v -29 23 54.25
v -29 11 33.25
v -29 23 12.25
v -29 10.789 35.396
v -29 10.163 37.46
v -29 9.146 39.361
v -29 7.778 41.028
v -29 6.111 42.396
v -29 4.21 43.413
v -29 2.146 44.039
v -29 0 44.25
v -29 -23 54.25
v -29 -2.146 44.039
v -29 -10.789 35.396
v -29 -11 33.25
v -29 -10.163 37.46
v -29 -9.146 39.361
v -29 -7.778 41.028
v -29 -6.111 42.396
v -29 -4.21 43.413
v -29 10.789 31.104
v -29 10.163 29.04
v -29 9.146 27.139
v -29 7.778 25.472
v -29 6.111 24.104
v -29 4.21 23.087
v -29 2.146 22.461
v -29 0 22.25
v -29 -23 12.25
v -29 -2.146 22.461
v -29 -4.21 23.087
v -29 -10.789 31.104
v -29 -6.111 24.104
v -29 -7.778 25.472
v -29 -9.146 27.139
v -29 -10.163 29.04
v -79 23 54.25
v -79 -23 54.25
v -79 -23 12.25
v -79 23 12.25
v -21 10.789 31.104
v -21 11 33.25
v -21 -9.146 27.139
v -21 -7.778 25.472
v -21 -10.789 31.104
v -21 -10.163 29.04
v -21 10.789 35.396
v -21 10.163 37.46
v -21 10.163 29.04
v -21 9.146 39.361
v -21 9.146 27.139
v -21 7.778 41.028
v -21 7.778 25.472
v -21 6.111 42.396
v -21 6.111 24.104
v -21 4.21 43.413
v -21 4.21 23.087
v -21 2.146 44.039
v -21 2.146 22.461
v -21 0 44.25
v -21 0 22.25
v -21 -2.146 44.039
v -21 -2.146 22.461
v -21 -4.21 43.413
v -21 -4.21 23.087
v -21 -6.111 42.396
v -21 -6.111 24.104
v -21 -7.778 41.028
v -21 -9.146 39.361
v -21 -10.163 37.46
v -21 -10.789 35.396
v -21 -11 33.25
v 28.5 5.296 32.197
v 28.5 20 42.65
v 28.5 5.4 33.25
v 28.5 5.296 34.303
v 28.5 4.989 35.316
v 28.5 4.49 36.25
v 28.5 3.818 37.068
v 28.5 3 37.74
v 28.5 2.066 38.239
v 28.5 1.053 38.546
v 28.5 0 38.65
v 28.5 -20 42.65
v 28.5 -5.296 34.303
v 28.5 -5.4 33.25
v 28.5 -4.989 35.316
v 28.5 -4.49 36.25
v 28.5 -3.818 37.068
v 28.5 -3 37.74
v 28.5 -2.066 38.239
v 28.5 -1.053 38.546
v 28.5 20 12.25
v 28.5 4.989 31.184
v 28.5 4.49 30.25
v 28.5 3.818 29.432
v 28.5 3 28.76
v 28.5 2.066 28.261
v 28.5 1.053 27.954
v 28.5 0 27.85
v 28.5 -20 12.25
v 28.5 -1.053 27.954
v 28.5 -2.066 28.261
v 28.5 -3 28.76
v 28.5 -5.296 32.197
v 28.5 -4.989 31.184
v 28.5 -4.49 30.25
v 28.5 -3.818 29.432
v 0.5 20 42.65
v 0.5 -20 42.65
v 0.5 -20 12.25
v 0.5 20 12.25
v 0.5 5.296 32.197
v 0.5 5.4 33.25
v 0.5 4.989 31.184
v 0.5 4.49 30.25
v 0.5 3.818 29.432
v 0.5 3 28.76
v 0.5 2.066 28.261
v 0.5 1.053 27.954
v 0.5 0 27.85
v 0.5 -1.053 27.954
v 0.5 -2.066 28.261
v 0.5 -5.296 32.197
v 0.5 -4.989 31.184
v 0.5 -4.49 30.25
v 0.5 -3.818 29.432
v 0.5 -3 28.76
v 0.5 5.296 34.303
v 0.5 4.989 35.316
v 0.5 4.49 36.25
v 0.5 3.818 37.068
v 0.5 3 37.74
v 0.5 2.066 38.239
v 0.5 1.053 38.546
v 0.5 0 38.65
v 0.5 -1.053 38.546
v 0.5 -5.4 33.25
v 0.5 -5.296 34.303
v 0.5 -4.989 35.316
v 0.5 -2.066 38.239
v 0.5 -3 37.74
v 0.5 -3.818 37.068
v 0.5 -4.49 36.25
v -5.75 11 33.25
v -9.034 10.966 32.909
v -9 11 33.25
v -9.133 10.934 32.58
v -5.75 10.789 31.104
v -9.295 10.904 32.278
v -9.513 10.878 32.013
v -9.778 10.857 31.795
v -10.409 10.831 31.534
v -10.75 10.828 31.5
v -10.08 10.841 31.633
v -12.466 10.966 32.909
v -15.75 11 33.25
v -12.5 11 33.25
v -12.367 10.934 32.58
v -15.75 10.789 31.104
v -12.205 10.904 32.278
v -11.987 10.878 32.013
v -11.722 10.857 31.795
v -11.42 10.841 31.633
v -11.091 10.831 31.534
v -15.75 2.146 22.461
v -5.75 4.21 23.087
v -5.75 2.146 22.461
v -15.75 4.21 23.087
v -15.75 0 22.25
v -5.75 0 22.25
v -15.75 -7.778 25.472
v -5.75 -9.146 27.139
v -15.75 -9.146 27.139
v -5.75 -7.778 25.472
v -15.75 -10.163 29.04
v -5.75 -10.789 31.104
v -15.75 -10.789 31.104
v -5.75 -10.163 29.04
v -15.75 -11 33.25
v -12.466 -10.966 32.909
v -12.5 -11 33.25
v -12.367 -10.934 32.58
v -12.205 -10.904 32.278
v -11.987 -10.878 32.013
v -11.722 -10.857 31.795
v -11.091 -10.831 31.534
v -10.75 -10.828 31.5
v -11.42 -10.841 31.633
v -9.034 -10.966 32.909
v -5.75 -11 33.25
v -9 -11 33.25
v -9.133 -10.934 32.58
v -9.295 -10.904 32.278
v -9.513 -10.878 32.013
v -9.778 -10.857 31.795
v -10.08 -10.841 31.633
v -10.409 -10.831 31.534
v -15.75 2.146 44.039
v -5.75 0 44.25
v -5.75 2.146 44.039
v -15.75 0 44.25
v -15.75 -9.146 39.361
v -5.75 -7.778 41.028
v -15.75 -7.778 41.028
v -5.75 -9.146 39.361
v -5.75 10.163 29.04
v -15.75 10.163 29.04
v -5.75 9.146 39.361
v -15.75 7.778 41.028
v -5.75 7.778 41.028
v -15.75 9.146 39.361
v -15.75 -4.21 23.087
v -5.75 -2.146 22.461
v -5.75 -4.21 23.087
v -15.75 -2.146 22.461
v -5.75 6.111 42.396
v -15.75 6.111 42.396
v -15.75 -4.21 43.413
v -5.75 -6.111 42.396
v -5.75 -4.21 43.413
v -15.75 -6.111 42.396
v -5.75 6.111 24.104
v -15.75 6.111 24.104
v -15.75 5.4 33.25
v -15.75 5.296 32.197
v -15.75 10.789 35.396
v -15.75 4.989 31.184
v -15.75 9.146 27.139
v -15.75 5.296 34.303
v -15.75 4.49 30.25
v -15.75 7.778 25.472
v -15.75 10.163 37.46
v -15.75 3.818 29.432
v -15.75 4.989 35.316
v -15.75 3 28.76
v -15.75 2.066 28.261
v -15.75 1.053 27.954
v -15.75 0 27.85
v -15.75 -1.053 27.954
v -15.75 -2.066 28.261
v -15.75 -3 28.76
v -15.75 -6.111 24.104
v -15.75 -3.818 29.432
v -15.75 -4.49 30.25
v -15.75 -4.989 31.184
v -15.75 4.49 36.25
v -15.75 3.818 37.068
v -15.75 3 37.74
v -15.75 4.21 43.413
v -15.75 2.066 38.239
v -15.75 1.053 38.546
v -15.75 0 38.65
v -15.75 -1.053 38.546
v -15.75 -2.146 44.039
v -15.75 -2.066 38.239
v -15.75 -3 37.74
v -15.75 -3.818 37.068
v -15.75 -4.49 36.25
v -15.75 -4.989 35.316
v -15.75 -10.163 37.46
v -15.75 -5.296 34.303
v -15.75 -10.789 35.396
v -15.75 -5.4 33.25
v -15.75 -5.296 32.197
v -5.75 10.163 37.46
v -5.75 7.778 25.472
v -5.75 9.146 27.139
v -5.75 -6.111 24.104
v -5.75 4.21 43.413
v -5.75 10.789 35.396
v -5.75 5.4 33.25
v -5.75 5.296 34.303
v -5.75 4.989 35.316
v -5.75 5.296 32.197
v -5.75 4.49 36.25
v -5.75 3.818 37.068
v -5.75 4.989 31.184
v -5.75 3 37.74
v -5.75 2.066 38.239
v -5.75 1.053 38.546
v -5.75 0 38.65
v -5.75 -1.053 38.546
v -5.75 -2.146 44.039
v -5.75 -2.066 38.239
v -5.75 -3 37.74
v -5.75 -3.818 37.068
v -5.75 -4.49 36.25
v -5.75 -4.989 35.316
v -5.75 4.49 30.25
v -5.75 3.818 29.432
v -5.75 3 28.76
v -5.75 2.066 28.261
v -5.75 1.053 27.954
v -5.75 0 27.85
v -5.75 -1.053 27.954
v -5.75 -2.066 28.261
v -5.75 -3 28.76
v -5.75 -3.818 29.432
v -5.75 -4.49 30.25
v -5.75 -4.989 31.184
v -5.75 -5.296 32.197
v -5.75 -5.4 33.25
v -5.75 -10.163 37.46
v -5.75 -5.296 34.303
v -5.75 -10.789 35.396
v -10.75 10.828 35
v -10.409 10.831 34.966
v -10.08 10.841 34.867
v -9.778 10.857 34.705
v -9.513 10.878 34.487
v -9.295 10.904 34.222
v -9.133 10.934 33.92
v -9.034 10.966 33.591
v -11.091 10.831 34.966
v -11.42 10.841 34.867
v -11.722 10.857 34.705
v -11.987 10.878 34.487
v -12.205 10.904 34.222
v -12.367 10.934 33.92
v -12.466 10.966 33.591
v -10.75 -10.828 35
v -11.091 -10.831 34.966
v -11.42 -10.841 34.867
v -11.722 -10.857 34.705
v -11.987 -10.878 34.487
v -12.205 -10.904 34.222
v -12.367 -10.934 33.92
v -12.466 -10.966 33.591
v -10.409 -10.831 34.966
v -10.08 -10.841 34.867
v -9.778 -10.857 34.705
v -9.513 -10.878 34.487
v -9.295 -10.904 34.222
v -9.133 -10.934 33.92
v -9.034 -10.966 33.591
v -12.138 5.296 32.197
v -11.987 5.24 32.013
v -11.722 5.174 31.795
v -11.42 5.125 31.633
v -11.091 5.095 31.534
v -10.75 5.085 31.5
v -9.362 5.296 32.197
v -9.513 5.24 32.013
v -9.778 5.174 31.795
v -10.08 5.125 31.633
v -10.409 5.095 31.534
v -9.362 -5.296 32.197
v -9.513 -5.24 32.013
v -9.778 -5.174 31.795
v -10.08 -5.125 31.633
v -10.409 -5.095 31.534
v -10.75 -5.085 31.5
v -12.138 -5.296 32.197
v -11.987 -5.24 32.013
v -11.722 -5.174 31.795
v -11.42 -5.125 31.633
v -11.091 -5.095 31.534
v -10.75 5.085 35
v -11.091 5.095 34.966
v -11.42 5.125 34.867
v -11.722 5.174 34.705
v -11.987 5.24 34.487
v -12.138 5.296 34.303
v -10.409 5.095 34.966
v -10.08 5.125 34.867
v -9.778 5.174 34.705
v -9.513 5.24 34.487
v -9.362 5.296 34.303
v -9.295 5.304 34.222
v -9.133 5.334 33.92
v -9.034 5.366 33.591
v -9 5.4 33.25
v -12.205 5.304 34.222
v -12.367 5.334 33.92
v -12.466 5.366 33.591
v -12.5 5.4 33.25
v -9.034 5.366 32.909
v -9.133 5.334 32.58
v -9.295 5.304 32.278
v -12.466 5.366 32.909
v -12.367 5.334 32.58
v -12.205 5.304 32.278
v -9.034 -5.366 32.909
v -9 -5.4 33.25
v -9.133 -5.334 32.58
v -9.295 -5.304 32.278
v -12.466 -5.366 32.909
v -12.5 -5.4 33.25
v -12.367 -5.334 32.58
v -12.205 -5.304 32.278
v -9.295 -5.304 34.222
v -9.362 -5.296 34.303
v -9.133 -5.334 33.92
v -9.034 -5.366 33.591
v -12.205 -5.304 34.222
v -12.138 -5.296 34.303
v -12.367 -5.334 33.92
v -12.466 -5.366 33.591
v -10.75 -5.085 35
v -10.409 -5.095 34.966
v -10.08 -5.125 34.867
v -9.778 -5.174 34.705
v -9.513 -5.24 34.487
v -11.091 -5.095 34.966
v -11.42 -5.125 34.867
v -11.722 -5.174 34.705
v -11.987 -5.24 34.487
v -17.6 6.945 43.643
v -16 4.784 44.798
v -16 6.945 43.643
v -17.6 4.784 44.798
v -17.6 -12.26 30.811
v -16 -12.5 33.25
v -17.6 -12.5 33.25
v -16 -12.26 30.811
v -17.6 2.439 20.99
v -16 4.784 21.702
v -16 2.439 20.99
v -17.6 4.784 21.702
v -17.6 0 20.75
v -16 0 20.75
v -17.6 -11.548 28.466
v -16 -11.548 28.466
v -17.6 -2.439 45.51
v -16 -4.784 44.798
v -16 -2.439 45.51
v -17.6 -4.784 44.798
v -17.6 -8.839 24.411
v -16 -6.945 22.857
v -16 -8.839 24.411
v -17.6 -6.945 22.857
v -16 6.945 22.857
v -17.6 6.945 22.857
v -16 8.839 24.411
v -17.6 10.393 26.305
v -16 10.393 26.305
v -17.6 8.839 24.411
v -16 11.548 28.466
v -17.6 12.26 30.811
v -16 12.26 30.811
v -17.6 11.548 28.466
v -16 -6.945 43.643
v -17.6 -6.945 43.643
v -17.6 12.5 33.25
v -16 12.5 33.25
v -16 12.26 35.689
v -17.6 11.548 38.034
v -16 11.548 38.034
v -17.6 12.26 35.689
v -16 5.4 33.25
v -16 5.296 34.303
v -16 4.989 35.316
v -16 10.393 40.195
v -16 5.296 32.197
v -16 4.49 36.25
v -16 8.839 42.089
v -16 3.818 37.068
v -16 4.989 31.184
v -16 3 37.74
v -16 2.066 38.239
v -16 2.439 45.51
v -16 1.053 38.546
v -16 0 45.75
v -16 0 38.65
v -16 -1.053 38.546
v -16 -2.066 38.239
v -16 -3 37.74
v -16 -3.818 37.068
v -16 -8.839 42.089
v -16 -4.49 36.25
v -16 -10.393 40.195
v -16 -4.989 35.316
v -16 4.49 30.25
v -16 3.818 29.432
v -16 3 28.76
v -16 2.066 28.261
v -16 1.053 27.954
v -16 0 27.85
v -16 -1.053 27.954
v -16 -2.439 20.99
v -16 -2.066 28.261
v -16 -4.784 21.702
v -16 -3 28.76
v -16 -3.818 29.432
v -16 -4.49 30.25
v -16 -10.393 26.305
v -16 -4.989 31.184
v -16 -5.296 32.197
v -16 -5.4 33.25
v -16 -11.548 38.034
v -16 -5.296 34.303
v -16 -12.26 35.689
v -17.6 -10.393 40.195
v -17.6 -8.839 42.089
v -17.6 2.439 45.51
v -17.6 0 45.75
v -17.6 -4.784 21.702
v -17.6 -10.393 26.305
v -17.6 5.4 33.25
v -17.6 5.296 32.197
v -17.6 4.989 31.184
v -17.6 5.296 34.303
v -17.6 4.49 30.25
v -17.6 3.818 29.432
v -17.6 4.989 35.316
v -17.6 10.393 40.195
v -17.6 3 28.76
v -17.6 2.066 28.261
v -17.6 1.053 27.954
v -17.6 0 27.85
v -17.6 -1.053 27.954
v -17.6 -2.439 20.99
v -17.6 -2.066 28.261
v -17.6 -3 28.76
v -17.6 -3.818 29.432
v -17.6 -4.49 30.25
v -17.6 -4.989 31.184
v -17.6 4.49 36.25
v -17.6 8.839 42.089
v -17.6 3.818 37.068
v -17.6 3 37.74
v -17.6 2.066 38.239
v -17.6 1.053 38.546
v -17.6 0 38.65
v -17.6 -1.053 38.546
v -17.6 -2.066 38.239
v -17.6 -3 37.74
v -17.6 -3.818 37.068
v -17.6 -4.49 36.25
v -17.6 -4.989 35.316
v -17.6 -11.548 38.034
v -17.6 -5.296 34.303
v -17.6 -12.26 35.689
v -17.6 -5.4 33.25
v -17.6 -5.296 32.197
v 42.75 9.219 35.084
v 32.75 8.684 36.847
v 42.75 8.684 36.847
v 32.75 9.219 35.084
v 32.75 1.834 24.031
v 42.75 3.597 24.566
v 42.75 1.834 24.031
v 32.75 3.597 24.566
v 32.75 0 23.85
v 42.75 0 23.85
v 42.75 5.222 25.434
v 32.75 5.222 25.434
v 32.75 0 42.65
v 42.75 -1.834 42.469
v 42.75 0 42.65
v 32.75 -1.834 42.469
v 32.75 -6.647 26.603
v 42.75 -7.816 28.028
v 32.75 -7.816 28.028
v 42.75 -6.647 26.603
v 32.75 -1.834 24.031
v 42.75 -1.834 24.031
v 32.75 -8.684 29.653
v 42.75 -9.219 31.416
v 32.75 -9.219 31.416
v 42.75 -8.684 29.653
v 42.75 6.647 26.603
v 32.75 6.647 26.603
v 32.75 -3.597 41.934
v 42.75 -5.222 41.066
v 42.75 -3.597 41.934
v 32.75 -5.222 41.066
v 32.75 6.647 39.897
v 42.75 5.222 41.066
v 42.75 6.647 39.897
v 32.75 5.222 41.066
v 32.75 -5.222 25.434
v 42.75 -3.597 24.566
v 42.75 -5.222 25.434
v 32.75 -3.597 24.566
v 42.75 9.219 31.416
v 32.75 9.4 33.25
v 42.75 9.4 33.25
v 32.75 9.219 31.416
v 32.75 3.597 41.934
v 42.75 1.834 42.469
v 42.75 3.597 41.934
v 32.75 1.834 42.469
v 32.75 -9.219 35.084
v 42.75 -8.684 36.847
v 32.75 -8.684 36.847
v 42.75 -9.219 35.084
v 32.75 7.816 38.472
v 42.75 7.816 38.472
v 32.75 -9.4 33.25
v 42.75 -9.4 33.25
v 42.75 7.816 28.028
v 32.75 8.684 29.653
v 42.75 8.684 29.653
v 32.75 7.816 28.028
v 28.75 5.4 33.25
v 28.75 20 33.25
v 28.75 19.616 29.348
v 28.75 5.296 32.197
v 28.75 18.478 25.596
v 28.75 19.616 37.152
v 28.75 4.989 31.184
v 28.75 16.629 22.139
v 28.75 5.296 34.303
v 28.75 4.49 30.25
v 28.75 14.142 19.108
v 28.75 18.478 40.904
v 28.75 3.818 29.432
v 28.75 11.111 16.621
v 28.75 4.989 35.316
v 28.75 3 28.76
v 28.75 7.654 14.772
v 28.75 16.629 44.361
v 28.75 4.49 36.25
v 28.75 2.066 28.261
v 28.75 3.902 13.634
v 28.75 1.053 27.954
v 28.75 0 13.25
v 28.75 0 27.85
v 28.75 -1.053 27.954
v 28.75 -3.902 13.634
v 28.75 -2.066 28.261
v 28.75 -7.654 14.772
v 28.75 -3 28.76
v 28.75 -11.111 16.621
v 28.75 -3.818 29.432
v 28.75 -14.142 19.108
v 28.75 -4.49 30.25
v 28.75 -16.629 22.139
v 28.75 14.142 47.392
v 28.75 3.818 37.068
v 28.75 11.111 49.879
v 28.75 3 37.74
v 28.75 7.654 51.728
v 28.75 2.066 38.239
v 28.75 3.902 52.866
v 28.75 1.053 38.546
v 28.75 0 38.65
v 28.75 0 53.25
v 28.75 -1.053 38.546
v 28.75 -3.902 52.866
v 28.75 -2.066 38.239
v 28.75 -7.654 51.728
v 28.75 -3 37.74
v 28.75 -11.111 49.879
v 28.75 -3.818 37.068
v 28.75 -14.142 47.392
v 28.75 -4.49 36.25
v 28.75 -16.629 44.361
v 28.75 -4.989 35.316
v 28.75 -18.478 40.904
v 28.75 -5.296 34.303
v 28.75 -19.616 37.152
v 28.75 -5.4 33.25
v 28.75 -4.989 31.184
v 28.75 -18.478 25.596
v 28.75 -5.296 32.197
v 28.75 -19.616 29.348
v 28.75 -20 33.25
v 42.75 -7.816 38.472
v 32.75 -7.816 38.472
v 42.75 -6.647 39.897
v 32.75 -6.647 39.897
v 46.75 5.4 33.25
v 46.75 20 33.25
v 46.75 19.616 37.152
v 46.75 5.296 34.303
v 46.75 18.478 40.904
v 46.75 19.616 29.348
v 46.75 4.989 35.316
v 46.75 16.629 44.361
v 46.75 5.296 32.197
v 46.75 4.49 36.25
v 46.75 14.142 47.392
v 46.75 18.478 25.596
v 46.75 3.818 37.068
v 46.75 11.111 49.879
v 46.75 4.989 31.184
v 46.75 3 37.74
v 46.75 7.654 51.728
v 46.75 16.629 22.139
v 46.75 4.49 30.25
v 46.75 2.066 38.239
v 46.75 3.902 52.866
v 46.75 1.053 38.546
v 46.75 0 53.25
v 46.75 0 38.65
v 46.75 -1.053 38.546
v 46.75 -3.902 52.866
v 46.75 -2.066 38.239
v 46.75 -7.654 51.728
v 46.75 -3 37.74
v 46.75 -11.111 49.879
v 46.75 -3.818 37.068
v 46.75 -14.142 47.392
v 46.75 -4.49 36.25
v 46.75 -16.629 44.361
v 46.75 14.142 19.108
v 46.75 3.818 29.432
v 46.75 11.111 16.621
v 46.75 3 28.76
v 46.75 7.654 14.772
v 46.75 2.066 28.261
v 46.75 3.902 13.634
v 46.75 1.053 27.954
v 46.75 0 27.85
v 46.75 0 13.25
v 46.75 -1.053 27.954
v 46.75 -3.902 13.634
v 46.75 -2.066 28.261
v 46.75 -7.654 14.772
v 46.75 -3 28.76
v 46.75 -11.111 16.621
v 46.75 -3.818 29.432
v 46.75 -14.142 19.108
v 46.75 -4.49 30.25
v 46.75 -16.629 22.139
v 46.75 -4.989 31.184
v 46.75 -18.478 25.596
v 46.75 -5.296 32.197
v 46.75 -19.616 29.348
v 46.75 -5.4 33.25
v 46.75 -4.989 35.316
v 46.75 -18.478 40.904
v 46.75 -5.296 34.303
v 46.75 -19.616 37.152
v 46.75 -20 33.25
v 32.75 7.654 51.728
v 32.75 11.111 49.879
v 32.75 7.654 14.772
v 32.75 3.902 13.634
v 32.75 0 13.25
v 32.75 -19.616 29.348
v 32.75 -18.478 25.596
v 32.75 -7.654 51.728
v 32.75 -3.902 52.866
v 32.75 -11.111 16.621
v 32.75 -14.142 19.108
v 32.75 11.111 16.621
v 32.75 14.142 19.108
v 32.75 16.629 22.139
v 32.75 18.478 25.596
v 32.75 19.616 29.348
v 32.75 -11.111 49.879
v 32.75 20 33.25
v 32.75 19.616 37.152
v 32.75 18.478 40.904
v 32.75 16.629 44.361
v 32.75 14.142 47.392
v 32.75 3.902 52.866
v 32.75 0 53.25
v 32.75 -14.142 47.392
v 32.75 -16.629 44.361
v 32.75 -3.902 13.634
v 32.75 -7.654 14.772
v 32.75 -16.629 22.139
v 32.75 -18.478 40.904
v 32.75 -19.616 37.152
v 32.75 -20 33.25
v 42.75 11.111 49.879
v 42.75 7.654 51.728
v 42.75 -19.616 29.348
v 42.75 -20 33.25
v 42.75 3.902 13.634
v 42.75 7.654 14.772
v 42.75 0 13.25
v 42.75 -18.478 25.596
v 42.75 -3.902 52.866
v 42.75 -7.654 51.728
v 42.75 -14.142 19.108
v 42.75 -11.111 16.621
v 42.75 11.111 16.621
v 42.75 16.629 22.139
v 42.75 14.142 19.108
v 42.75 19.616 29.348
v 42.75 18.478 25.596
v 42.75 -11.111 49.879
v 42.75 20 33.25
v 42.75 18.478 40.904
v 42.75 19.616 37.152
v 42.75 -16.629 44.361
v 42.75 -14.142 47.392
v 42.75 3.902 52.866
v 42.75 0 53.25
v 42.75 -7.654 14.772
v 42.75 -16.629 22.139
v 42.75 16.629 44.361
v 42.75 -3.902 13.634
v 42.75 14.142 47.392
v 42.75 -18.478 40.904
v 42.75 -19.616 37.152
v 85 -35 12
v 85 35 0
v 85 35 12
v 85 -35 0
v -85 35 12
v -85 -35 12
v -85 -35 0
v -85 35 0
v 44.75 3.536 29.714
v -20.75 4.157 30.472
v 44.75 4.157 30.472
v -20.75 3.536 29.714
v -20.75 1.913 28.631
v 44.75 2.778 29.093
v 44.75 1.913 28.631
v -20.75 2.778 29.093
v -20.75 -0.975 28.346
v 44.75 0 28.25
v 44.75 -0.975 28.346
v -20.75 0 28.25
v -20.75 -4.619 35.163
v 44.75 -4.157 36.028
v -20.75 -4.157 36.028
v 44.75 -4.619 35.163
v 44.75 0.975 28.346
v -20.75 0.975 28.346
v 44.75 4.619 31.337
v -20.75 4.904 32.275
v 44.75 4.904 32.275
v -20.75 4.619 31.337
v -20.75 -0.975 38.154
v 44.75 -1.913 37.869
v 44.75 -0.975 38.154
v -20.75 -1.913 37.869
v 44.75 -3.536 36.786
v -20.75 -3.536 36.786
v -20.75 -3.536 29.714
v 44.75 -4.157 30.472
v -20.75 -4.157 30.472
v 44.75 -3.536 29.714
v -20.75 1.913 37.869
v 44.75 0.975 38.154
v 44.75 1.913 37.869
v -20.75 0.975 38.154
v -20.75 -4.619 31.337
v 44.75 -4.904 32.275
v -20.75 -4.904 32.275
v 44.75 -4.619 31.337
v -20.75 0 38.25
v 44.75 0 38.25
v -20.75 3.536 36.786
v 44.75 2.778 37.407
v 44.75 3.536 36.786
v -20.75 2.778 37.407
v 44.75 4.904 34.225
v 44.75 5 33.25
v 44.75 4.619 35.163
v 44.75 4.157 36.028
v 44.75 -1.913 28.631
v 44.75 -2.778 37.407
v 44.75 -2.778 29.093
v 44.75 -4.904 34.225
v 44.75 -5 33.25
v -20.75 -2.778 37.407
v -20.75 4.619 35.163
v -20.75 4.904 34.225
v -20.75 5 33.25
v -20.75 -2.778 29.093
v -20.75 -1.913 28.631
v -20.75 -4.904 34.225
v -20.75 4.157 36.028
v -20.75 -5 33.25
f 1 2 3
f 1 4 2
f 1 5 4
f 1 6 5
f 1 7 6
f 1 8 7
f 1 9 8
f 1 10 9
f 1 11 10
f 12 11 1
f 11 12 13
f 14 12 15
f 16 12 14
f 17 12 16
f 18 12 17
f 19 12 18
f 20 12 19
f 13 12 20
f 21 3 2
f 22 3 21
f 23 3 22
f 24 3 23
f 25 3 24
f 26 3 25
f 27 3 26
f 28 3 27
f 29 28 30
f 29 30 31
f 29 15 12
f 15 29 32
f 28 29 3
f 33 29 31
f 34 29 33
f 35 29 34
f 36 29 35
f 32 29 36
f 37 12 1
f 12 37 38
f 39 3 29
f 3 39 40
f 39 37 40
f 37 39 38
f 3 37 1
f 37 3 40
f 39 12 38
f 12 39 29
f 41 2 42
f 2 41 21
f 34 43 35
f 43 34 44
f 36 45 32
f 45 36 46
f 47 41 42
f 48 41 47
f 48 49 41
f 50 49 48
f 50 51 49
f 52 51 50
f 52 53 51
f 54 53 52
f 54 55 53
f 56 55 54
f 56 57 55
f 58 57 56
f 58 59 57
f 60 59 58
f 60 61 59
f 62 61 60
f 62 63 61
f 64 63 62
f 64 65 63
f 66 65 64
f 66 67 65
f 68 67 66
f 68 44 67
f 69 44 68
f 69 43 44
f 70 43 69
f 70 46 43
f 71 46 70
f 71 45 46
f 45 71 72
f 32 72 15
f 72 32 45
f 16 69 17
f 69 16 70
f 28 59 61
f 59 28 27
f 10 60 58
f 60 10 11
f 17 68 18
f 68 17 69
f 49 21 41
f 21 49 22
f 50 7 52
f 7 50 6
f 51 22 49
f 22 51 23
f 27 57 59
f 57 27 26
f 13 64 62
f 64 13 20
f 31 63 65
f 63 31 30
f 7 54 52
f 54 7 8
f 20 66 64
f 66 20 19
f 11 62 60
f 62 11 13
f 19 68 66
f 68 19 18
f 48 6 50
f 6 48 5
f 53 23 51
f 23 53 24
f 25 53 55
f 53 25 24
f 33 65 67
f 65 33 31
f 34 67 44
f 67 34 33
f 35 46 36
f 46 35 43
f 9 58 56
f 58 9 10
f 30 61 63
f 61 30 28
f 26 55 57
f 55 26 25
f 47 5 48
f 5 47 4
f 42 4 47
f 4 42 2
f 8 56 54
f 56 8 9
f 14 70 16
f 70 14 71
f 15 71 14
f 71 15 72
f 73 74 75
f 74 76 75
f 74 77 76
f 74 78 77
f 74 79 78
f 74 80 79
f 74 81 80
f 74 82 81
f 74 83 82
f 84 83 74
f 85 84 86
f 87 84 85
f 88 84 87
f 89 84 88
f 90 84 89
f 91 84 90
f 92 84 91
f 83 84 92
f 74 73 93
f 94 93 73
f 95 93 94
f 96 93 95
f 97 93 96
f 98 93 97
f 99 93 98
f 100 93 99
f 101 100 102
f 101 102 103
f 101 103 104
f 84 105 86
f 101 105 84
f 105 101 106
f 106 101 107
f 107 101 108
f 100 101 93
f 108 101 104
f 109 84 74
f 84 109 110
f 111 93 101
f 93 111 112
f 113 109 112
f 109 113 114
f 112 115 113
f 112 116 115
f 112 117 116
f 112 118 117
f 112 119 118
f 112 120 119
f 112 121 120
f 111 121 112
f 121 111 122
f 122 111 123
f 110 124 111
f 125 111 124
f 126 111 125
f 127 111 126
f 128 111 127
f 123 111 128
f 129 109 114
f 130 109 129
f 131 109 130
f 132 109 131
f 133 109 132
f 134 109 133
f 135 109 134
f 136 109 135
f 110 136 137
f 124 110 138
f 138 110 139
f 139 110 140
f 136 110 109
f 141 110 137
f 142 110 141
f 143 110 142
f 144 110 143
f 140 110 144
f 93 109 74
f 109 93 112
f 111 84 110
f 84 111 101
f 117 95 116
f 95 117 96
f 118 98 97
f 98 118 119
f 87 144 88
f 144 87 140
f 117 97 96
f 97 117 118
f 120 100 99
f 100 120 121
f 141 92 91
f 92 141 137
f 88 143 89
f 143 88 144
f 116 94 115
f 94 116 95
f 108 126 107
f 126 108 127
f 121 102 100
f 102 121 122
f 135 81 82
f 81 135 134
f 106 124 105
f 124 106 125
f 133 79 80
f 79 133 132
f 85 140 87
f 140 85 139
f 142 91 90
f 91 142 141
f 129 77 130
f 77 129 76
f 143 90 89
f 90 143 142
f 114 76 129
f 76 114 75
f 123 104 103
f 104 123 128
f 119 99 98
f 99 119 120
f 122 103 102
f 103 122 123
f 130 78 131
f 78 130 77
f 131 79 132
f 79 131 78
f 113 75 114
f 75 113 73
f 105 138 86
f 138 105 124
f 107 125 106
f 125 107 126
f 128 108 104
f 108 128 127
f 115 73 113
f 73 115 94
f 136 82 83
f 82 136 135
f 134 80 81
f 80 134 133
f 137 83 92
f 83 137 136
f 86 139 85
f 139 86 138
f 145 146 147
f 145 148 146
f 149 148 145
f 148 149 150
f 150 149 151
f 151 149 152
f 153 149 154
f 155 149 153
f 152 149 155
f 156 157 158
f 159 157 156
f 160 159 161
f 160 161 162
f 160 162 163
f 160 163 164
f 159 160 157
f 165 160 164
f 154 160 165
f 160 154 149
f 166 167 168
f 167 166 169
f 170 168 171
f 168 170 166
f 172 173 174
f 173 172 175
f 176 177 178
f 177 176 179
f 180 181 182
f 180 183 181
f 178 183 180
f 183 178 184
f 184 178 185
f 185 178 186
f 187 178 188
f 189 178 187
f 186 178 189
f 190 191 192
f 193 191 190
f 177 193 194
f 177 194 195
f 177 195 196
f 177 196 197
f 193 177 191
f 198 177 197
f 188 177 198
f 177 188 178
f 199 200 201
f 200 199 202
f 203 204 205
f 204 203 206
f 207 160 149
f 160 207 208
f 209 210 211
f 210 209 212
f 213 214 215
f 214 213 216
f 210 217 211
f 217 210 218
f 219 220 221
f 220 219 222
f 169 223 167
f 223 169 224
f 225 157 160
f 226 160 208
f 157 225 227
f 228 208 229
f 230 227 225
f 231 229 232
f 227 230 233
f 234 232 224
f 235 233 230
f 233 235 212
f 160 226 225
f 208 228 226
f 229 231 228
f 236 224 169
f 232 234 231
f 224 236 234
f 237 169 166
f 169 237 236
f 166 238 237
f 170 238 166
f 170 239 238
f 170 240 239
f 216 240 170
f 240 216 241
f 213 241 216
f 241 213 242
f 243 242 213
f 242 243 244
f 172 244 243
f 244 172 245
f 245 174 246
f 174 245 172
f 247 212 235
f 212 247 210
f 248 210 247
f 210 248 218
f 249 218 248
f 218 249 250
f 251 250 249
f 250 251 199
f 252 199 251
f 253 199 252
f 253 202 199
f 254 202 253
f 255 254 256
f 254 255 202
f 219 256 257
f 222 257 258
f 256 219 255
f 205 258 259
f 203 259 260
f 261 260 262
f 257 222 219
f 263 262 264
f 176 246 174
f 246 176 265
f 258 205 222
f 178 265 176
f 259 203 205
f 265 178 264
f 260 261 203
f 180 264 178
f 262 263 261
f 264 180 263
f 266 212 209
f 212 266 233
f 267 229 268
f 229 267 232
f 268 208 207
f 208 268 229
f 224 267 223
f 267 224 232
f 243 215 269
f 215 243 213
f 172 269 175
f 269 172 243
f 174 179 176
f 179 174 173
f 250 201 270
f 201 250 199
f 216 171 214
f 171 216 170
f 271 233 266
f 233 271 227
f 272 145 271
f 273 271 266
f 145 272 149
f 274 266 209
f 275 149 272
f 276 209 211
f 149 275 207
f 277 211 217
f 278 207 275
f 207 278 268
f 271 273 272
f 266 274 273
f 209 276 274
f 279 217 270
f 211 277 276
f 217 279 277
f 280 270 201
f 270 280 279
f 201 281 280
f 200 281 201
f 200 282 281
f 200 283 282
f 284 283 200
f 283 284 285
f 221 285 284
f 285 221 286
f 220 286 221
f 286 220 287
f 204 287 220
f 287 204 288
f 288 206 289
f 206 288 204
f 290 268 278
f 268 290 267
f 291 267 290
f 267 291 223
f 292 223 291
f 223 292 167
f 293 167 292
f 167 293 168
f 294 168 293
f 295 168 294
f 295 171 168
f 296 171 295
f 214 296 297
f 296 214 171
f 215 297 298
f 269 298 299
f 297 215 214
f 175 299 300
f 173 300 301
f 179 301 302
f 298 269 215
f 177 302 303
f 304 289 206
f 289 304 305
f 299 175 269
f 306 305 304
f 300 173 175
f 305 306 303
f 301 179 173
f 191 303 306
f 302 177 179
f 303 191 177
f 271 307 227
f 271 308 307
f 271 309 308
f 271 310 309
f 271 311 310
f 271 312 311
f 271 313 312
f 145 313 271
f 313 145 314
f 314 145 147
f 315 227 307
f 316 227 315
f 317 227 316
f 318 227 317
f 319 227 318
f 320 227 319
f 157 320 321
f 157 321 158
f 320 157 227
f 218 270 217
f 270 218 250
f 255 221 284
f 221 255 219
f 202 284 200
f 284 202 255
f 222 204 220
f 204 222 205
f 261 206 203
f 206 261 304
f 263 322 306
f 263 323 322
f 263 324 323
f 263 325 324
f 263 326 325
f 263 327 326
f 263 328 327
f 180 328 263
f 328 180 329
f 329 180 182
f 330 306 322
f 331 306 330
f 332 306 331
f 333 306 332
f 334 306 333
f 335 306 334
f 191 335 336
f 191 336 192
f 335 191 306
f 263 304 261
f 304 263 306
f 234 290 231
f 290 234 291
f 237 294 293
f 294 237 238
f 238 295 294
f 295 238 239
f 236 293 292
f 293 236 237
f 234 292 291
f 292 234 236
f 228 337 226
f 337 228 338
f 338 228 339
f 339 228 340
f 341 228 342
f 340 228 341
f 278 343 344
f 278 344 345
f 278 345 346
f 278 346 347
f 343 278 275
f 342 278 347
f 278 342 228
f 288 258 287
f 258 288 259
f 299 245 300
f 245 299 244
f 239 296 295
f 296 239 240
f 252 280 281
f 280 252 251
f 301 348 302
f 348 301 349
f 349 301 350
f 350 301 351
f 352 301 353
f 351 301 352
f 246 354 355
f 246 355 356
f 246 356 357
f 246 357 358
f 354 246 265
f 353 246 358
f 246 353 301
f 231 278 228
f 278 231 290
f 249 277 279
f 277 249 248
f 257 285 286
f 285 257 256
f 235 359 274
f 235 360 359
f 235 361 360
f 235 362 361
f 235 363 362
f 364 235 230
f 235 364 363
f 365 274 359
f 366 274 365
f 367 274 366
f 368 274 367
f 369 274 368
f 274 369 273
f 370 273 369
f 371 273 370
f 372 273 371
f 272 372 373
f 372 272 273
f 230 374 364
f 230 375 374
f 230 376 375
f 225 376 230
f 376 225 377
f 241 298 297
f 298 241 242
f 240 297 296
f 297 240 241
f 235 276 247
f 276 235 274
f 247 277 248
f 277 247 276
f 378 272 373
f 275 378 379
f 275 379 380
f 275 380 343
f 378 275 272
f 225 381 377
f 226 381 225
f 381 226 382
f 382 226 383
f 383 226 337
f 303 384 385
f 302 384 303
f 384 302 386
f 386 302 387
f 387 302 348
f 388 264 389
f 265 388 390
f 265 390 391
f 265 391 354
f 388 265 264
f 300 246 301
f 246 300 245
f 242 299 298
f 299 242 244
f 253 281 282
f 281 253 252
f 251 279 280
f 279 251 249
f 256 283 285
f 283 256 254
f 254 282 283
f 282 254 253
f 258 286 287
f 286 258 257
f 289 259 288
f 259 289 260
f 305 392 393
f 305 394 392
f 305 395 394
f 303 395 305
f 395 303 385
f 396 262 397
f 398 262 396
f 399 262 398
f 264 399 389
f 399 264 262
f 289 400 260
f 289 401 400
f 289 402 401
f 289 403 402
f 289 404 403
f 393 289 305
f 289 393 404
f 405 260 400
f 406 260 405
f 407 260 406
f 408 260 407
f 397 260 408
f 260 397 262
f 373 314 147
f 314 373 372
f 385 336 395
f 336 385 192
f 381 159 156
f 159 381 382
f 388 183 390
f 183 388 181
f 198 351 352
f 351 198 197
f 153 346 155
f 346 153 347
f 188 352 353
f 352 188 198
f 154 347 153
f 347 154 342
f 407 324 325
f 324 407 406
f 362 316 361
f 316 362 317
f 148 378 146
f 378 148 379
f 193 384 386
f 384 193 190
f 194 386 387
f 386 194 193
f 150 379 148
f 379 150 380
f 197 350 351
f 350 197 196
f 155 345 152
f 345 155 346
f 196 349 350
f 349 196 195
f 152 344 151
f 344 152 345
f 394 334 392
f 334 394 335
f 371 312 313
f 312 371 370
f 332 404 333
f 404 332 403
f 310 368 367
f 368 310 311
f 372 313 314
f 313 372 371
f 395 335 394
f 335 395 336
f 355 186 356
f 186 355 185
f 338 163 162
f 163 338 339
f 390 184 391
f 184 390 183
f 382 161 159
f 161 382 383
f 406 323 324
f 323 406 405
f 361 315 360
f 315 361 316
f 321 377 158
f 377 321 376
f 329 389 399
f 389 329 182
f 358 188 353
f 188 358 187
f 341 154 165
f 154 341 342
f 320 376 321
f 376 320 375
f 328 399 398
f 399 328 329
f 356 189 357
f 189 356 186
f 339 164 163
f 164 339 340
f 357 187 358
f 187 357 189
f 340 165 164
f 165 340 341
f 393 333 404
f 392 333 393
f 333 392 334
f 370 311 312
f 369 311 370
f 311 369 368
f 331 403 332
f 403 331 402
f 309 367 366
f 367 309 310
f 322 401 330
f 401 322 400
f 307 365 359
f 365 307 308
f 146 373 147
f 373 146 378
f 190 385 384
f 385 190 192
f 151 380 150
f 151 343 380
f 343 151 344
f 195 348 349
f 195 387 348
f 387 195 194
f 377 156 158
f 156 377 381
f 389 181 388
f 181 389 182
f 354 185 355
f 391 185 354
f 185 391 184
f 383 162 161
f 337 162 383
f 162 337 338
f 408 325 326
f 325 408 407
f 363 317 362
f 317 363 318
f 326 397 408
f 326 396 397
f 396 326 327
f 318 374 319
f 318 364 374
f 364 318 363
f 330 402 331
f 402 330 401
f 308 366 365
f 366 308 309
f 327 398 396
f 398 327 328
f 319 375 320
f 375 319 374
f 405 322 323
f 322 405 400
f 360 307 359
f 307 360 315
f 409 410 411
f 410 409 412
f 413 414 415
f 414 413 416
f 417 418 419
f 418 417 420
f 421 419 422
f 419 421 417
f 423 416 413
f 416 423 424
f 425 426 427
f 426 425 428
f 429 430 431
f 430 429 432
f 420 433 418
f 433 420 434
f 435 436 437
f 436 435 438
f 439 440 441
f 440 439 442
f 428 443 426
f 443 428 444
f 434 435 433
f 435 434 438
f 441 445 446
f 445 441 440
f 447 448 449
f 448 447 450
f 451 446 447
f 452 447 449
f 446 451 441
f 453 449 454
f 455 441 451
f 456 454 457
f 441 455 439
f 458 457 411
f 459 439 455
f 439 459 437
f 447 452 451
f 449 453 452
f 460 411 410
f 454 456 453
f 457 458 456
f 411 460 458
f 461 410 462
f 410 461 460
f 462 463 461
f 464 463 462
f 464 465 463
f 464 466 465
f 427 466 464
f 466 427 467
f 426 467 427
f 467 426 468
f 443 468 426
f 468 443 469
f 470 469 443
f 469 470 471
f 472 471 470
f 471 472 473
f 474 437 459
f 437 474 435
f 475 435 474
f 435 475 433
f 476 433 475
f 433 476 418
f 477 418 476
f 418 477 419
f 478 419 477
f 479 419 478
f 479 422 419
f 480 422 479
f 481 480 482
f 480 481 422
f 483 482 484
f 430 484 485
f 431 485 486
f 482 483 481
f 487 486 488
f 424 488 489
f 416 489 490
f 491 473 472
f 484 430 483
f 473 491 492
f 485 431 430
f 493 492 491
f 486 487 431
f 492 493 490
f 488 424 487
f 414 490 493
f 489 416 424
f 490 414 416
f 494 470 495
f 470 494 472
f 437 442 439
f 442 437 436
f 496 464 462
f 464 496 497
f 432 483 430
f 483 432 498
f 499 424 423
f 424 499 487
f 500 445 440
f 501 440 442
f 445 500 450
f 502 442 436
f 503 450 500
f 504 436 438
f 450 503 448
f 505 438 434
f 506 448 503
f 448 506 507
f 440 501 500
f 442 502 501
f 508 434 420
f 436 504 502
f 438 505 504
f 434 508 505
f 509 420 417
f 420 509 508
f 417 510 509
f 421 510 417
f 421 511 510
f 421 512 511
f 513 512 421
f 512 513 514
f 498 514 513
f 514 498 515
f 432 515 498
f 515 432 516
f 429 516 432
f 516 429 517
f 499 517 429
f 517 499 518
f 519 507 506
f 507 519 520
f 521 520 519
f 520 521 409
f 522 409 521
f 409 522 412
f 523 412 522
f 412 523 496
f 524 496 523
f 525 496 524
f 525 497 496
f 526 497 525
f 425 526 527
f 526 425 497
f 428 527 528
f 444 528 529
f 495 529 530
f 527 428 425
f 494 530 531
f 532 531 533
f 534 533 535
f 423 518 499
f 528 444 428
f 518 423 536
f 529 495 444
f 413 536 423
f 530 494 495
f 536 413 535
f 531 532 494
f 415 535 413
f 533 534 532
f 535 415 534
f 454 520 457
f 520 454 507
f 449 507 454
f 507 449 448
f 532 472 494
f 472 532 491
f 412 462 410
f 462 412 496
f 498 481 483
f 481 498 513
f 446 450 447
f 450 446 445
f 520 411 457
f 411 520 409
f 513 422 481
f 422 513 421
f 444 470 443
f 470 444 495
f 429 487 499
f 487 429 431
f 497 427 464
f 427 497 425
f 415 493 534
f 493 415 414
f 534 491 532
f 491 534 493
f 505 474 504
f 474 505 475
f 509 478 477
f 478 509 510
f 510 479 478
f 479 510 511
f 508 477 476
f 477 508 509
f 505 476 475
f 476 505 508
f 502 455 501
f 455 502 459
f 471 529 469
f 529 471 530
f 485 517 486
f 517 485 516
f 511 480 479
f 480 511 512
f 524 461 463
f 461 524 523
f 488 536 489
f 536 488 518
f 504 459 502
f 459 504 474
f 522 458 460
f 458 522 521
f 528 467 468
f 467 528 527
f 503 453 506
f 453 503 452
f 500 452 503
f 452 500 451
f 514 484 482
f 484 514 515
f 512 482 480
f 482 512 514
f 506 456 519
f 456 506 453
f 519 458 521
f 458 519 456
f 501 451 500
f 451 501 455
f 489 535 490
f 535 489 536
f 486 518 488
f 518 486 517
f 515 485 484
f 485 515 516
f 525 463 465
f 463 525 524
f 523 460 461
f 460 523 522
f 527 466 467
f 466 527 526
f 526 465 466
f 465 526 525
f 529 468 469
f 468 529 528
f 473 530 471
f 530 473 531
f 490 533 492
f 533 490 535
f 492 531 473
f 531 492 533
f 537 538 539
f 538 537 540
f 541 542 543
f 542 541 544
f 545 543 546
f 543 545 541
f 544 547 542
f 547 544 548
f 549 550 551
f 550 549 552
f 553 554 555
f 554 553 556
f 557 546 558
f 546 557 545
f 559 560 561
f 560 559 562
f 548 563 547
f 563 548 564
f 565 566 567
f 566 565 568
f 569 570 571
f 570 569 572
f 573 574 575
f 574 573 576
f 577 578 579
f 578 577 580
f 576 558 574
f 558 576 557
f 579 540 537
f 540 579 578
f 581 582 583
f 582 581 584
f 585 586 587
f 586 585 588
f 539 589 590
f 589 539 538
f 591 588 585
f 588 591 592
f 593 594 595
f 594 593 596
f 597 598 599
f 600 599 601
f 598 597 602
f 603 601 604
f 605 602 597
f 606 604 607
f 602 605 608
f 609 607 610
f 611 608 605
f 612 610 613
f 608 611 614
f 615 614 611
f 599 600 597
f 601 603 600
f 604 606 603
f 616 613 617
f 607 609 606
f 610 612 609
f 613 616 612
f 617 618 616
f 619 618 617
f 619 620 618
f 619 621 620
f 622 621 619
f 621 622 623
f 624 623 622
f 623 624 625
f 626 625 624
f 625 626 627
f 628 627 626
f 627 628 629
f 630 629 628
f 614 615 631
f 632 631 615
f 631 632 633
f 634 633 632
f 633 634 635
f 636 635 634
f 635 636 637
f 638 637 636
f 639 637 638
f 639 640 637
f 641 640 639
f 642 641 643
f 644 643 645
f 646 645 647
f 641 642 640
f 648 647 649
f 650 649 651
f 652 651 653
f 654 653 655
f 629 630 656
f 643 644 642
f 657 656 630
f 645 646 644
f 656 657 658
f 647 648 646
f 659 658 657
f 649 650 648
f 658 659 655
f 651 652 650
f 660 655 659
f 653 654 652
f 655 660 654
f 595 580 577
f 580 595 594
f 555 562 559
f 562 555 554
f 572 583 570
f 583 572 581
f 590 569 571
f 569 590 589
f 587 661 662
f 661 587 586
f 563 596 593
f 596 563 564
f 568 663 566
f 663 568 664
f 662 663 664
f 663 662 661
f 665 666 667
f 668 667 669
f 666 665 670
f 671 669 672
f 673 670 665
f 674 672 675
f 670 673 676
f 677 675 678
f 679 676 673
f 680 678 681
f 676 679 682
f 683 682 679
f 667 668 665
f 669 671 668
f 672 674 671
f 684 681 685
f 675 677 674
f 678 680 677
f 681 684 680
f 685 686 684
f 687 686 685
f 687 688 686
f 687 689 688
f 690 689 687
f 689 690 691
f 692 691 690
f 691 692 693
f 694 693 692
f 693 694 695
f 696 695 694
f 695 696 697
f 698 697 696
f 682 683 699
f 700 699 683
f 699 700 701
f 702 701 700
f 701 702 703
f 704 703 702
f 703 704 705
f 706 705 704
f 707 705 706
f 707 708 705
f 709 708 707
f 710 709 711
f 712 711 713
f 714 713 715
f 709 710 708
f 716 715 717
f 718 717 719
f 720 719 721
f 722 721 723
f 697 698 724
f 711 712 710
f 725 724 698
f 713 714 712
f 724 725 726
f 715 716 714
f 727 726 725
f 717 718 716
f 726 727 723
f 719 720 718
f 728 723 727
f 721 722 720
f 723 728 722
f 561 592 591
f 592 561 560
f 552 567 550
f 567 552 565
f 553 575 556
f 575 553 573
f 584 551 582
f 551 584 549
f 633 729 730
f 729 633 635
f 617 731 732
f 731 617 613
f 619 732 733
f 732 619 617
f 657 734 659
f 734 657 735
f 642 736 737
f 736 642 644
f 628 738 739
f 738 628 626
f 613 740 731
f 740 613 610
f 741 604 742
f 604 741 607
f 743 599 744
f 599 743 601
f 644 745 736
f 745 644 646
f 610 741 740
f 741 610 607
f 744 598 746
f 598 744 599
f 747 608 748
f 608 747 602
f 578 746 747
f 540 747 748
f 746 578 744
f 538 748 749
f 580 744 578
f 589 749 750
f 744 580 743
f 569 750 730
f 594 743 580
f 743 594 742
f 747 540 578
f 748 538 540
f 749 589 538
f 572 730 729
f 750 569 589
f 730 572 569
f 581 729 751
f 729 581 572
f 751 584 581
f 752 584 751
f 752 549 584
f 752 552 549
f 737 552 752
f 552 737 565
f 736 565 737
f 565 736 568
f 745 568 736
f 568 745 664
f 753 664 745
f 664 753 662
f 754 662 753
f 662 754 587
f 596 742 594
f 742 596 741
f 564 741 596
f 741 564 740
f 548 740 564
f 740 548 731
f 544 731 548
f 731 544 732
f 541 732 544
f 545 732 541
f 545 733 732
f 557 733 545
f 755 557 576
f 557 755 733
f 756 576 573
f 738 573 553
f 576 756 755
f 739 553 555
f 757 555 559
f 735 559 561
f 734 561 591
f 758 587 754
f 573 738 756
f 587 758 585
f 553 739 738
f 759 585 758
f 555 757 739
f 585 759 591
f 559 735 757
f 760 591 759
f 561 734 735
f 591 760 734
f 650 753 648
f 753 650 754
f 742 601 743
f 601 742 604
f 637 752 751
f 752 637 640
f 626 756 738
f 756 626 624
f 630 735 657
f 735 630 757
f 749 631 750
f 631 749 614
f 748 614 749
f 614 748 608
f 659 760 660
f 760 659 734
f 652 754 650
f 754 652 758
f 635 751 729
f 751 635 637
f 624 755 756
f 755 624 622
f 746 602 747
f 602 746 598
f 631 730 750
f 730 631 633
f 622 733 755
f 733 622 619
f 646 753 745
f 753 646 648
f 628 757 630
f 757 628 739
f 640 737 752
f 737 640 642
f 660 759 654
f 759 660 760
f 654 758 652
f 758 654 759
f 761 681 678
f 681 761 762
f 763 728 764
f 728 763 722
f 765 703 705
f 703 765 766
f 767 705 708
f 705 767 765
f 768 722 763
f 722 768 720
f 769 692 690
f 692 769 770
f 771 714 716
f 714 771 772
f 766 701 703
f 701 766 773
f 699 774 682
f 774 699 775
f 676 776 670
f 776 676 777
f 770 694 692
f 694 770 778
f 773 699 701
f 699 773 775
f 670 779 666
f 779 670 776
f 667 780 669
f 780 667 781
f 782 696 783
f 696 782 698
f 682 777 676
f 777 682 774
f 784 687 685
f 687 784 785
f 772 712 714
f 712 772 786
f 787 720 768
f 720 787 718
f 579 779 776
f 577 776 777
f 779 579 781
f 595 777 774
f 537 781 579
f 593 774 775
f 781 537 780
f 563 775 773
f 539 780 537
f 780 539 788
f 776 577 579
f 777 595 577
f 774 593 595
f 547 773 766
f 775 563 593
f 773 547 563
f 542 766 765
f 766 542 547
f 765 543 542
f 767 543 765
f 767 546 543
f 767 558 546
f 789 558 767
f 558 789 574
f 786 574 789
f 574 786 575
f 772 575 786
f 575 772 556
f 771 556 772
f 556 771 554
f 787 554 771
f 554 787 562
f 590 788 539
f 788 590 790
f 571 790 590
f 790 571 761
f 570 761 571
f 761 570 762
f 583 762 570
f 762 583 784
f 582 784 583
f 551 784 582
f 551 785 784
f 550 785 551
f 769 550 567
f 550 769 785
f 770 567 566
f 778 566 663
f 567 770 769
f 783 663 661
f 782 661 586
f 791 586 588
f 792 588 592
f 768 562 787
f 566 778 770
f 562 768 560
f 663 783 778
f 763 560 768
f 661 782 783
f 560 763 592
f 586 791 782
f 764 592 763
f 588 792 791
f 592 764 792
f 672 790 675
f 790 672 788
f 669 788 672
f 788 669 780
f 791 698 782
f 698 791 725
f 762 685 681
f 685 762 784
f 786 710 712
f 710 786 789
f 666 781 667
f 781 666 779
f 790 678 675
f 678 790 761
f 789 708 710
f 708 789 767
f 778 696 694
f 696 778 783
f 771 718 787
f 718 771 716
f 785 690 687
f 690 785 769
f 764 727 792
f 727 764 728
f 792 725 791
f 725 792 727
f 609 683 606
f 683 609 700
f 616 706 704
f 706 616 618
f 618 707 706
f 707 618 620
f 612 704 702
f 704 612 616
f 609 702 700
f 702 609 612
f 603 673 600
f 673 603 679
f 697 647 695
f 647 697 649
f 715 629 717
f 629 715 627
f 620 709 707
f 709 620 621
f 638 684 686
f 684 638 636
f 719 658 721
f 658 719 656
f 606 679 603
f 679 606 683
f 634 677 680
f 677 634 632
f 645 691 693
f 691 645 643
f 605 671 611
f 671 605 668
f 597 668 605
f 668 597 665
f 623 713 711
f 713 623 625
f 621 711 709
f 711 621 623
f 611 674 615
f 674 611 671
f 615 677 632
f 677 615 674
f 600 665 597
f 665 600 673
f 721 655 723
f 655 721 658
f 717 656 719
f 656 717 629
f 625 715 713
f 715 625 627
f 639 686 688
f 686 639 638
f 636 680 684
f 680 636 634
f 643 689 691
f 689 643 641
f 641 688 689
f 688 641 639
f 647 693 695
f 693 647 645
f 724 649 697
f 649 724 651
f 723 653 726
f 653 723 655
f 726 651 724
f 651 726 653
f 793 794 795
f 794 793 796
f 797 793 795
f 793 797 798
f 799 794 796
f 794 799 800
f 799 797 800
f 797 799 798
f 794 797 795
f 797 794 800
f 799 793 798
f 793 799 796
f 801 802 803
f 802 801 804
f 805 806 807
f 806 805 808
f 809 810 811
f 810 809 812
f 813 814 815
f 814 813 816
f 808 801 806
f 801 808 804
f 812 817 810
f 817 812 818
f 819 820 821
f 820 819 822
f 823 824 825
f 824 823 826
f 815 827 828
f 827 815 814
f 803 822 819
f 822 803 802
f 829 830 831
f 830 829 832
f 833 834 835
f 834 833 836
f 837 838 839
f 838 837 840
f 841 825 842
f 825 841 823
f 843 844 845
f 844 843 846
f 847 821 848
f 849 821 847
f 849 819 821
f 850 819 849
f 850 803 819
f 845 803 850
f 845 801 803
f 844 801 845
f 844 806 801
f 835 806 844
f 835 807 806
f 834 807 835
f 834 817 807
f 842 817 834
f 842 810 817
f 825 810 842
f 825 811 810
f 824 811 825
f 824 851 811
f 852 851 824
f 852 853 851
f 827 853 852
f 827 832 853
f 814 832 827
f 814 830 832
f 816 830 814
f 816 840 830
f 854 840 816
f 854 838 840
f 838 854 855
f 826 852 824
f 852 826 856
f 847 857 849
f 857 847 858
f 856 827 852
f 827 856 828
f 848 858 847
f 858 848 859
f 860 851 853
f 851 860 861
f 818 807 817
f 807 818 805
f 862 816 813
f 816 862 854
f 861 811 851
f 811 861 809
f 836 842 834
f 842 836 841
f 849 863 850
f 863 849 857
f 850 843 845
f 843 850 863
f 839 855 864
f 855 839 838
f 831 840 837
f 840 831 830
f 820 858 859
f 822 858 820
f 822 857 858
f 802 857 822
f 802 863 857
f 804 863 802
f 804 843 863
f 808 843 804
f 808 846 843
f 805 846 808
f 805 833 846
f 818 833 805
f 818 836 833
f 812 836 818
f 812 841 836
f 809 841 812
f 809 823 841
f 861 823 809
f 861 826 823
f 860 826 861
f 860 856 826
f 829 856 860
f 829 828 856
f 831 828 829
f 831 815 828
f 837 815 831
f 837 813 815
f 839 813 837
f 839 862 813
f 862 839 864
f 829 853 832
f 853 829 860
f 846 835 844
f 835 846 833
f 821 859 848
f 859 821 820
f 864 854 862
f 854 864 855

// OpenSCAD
$fn = 32;

// ------------------------------------------------------------------------
// Motor drive station: motor 50 x 42 mm, shaft d10, pulley d40
// Every part is its own module, assembly() places every instance.
// ------------------------------------------------------------------------

// --- part 1 ---
module station_bed() {
  difference() {
    translate([-85, -35, 0]) cube([170, 70, 12]);
  }
}

// --- part 2 ---
module drive_motor() {
  union() {
    translate([-25, -23, 0]) cube([50, 46, 42]);
    translate([29, 0, 21]) rotate([0, 90, 0]) cylinder(h = 8, d = 22, center = true);
  }
}

// --- part 3 ---
module pillow_block() {
  difference() {
    translate([-14, -20, 0]) cube([28, 40, 30.4]);
    translate([0, 0, 21]) rotate([0, 90, 0]) cylinder(h = 30, d = 10.8, center = true);
  }
}

// --- part 4 ---
module drive_shaft() {
  translate([0, 0, -32.75]) cylinder(h = 65.5, d = 10);
}

// --- part 5 ---
module shaft_collar() {
  difference() {
    cylinder(h = 10, d = 22);
    translate([0, 0, -1]) cylinder(h = 12, d = 10.8);
    translate([0, 0, 5]) rotate([90, 0, 0]) cylinder(h = 24, d = 3.5, center = true);
  }
}

// --- part 6 ---
module collar_washer() {
  difference() {
      translate([0, 0, 0]) cylinder(h = 1.6, d = 25);
      translate([0, 0, -1]) cylinder(h = 3.6, d = 10.8);
    }
}

// --- part 7 ---
module drive_pulley() {
  difference() {
    union() {
      cylinder(h = 18, d = 18.8);
      cylinder(h = 4, d = 40);
      translate([0, 0, 14]) cylinder(h = 4, d = 40);
    }
    translate([0, 0, -1]) cylinder(h = 20, d = 10.8);
  }
}

// --- assembly ---
module assembly() {
  color([0.80, 0.24, 0.20]) translate([0, 0, 0]) rotate([0, 0, 0]) station_bed();
  color([0.20, 0.45, 0.75]) translate([-54, 0, 12.25]) rotate([0, 0, 0]) drive_motor();
  color([0.25, 0.62, 0.32]) translate([14.5, 0, 12.25]) rotate([0, 0, 0]) pillow_block();
  color([0.92, 0.70, 0.18]) translate([12, 0, 33.25]) rotate([0, 90, 0]) drive_shaft();
  color([0.58, 0.35, 0.70]) translate([-15.75, 0, 33.25]) rotate([0, 90, 0]) shaft_collar();
  color([0.16, 0.66, 0.66]) translate([-17.6, 0, 33.25]) rotate([0, 90, 0]) collar_washer();
  color([0.85, 0.48, 0.18]) translate([28.75, 0, 33.25]) rotate([0, 90, 0]) drive_pulley();
}

assembly();
